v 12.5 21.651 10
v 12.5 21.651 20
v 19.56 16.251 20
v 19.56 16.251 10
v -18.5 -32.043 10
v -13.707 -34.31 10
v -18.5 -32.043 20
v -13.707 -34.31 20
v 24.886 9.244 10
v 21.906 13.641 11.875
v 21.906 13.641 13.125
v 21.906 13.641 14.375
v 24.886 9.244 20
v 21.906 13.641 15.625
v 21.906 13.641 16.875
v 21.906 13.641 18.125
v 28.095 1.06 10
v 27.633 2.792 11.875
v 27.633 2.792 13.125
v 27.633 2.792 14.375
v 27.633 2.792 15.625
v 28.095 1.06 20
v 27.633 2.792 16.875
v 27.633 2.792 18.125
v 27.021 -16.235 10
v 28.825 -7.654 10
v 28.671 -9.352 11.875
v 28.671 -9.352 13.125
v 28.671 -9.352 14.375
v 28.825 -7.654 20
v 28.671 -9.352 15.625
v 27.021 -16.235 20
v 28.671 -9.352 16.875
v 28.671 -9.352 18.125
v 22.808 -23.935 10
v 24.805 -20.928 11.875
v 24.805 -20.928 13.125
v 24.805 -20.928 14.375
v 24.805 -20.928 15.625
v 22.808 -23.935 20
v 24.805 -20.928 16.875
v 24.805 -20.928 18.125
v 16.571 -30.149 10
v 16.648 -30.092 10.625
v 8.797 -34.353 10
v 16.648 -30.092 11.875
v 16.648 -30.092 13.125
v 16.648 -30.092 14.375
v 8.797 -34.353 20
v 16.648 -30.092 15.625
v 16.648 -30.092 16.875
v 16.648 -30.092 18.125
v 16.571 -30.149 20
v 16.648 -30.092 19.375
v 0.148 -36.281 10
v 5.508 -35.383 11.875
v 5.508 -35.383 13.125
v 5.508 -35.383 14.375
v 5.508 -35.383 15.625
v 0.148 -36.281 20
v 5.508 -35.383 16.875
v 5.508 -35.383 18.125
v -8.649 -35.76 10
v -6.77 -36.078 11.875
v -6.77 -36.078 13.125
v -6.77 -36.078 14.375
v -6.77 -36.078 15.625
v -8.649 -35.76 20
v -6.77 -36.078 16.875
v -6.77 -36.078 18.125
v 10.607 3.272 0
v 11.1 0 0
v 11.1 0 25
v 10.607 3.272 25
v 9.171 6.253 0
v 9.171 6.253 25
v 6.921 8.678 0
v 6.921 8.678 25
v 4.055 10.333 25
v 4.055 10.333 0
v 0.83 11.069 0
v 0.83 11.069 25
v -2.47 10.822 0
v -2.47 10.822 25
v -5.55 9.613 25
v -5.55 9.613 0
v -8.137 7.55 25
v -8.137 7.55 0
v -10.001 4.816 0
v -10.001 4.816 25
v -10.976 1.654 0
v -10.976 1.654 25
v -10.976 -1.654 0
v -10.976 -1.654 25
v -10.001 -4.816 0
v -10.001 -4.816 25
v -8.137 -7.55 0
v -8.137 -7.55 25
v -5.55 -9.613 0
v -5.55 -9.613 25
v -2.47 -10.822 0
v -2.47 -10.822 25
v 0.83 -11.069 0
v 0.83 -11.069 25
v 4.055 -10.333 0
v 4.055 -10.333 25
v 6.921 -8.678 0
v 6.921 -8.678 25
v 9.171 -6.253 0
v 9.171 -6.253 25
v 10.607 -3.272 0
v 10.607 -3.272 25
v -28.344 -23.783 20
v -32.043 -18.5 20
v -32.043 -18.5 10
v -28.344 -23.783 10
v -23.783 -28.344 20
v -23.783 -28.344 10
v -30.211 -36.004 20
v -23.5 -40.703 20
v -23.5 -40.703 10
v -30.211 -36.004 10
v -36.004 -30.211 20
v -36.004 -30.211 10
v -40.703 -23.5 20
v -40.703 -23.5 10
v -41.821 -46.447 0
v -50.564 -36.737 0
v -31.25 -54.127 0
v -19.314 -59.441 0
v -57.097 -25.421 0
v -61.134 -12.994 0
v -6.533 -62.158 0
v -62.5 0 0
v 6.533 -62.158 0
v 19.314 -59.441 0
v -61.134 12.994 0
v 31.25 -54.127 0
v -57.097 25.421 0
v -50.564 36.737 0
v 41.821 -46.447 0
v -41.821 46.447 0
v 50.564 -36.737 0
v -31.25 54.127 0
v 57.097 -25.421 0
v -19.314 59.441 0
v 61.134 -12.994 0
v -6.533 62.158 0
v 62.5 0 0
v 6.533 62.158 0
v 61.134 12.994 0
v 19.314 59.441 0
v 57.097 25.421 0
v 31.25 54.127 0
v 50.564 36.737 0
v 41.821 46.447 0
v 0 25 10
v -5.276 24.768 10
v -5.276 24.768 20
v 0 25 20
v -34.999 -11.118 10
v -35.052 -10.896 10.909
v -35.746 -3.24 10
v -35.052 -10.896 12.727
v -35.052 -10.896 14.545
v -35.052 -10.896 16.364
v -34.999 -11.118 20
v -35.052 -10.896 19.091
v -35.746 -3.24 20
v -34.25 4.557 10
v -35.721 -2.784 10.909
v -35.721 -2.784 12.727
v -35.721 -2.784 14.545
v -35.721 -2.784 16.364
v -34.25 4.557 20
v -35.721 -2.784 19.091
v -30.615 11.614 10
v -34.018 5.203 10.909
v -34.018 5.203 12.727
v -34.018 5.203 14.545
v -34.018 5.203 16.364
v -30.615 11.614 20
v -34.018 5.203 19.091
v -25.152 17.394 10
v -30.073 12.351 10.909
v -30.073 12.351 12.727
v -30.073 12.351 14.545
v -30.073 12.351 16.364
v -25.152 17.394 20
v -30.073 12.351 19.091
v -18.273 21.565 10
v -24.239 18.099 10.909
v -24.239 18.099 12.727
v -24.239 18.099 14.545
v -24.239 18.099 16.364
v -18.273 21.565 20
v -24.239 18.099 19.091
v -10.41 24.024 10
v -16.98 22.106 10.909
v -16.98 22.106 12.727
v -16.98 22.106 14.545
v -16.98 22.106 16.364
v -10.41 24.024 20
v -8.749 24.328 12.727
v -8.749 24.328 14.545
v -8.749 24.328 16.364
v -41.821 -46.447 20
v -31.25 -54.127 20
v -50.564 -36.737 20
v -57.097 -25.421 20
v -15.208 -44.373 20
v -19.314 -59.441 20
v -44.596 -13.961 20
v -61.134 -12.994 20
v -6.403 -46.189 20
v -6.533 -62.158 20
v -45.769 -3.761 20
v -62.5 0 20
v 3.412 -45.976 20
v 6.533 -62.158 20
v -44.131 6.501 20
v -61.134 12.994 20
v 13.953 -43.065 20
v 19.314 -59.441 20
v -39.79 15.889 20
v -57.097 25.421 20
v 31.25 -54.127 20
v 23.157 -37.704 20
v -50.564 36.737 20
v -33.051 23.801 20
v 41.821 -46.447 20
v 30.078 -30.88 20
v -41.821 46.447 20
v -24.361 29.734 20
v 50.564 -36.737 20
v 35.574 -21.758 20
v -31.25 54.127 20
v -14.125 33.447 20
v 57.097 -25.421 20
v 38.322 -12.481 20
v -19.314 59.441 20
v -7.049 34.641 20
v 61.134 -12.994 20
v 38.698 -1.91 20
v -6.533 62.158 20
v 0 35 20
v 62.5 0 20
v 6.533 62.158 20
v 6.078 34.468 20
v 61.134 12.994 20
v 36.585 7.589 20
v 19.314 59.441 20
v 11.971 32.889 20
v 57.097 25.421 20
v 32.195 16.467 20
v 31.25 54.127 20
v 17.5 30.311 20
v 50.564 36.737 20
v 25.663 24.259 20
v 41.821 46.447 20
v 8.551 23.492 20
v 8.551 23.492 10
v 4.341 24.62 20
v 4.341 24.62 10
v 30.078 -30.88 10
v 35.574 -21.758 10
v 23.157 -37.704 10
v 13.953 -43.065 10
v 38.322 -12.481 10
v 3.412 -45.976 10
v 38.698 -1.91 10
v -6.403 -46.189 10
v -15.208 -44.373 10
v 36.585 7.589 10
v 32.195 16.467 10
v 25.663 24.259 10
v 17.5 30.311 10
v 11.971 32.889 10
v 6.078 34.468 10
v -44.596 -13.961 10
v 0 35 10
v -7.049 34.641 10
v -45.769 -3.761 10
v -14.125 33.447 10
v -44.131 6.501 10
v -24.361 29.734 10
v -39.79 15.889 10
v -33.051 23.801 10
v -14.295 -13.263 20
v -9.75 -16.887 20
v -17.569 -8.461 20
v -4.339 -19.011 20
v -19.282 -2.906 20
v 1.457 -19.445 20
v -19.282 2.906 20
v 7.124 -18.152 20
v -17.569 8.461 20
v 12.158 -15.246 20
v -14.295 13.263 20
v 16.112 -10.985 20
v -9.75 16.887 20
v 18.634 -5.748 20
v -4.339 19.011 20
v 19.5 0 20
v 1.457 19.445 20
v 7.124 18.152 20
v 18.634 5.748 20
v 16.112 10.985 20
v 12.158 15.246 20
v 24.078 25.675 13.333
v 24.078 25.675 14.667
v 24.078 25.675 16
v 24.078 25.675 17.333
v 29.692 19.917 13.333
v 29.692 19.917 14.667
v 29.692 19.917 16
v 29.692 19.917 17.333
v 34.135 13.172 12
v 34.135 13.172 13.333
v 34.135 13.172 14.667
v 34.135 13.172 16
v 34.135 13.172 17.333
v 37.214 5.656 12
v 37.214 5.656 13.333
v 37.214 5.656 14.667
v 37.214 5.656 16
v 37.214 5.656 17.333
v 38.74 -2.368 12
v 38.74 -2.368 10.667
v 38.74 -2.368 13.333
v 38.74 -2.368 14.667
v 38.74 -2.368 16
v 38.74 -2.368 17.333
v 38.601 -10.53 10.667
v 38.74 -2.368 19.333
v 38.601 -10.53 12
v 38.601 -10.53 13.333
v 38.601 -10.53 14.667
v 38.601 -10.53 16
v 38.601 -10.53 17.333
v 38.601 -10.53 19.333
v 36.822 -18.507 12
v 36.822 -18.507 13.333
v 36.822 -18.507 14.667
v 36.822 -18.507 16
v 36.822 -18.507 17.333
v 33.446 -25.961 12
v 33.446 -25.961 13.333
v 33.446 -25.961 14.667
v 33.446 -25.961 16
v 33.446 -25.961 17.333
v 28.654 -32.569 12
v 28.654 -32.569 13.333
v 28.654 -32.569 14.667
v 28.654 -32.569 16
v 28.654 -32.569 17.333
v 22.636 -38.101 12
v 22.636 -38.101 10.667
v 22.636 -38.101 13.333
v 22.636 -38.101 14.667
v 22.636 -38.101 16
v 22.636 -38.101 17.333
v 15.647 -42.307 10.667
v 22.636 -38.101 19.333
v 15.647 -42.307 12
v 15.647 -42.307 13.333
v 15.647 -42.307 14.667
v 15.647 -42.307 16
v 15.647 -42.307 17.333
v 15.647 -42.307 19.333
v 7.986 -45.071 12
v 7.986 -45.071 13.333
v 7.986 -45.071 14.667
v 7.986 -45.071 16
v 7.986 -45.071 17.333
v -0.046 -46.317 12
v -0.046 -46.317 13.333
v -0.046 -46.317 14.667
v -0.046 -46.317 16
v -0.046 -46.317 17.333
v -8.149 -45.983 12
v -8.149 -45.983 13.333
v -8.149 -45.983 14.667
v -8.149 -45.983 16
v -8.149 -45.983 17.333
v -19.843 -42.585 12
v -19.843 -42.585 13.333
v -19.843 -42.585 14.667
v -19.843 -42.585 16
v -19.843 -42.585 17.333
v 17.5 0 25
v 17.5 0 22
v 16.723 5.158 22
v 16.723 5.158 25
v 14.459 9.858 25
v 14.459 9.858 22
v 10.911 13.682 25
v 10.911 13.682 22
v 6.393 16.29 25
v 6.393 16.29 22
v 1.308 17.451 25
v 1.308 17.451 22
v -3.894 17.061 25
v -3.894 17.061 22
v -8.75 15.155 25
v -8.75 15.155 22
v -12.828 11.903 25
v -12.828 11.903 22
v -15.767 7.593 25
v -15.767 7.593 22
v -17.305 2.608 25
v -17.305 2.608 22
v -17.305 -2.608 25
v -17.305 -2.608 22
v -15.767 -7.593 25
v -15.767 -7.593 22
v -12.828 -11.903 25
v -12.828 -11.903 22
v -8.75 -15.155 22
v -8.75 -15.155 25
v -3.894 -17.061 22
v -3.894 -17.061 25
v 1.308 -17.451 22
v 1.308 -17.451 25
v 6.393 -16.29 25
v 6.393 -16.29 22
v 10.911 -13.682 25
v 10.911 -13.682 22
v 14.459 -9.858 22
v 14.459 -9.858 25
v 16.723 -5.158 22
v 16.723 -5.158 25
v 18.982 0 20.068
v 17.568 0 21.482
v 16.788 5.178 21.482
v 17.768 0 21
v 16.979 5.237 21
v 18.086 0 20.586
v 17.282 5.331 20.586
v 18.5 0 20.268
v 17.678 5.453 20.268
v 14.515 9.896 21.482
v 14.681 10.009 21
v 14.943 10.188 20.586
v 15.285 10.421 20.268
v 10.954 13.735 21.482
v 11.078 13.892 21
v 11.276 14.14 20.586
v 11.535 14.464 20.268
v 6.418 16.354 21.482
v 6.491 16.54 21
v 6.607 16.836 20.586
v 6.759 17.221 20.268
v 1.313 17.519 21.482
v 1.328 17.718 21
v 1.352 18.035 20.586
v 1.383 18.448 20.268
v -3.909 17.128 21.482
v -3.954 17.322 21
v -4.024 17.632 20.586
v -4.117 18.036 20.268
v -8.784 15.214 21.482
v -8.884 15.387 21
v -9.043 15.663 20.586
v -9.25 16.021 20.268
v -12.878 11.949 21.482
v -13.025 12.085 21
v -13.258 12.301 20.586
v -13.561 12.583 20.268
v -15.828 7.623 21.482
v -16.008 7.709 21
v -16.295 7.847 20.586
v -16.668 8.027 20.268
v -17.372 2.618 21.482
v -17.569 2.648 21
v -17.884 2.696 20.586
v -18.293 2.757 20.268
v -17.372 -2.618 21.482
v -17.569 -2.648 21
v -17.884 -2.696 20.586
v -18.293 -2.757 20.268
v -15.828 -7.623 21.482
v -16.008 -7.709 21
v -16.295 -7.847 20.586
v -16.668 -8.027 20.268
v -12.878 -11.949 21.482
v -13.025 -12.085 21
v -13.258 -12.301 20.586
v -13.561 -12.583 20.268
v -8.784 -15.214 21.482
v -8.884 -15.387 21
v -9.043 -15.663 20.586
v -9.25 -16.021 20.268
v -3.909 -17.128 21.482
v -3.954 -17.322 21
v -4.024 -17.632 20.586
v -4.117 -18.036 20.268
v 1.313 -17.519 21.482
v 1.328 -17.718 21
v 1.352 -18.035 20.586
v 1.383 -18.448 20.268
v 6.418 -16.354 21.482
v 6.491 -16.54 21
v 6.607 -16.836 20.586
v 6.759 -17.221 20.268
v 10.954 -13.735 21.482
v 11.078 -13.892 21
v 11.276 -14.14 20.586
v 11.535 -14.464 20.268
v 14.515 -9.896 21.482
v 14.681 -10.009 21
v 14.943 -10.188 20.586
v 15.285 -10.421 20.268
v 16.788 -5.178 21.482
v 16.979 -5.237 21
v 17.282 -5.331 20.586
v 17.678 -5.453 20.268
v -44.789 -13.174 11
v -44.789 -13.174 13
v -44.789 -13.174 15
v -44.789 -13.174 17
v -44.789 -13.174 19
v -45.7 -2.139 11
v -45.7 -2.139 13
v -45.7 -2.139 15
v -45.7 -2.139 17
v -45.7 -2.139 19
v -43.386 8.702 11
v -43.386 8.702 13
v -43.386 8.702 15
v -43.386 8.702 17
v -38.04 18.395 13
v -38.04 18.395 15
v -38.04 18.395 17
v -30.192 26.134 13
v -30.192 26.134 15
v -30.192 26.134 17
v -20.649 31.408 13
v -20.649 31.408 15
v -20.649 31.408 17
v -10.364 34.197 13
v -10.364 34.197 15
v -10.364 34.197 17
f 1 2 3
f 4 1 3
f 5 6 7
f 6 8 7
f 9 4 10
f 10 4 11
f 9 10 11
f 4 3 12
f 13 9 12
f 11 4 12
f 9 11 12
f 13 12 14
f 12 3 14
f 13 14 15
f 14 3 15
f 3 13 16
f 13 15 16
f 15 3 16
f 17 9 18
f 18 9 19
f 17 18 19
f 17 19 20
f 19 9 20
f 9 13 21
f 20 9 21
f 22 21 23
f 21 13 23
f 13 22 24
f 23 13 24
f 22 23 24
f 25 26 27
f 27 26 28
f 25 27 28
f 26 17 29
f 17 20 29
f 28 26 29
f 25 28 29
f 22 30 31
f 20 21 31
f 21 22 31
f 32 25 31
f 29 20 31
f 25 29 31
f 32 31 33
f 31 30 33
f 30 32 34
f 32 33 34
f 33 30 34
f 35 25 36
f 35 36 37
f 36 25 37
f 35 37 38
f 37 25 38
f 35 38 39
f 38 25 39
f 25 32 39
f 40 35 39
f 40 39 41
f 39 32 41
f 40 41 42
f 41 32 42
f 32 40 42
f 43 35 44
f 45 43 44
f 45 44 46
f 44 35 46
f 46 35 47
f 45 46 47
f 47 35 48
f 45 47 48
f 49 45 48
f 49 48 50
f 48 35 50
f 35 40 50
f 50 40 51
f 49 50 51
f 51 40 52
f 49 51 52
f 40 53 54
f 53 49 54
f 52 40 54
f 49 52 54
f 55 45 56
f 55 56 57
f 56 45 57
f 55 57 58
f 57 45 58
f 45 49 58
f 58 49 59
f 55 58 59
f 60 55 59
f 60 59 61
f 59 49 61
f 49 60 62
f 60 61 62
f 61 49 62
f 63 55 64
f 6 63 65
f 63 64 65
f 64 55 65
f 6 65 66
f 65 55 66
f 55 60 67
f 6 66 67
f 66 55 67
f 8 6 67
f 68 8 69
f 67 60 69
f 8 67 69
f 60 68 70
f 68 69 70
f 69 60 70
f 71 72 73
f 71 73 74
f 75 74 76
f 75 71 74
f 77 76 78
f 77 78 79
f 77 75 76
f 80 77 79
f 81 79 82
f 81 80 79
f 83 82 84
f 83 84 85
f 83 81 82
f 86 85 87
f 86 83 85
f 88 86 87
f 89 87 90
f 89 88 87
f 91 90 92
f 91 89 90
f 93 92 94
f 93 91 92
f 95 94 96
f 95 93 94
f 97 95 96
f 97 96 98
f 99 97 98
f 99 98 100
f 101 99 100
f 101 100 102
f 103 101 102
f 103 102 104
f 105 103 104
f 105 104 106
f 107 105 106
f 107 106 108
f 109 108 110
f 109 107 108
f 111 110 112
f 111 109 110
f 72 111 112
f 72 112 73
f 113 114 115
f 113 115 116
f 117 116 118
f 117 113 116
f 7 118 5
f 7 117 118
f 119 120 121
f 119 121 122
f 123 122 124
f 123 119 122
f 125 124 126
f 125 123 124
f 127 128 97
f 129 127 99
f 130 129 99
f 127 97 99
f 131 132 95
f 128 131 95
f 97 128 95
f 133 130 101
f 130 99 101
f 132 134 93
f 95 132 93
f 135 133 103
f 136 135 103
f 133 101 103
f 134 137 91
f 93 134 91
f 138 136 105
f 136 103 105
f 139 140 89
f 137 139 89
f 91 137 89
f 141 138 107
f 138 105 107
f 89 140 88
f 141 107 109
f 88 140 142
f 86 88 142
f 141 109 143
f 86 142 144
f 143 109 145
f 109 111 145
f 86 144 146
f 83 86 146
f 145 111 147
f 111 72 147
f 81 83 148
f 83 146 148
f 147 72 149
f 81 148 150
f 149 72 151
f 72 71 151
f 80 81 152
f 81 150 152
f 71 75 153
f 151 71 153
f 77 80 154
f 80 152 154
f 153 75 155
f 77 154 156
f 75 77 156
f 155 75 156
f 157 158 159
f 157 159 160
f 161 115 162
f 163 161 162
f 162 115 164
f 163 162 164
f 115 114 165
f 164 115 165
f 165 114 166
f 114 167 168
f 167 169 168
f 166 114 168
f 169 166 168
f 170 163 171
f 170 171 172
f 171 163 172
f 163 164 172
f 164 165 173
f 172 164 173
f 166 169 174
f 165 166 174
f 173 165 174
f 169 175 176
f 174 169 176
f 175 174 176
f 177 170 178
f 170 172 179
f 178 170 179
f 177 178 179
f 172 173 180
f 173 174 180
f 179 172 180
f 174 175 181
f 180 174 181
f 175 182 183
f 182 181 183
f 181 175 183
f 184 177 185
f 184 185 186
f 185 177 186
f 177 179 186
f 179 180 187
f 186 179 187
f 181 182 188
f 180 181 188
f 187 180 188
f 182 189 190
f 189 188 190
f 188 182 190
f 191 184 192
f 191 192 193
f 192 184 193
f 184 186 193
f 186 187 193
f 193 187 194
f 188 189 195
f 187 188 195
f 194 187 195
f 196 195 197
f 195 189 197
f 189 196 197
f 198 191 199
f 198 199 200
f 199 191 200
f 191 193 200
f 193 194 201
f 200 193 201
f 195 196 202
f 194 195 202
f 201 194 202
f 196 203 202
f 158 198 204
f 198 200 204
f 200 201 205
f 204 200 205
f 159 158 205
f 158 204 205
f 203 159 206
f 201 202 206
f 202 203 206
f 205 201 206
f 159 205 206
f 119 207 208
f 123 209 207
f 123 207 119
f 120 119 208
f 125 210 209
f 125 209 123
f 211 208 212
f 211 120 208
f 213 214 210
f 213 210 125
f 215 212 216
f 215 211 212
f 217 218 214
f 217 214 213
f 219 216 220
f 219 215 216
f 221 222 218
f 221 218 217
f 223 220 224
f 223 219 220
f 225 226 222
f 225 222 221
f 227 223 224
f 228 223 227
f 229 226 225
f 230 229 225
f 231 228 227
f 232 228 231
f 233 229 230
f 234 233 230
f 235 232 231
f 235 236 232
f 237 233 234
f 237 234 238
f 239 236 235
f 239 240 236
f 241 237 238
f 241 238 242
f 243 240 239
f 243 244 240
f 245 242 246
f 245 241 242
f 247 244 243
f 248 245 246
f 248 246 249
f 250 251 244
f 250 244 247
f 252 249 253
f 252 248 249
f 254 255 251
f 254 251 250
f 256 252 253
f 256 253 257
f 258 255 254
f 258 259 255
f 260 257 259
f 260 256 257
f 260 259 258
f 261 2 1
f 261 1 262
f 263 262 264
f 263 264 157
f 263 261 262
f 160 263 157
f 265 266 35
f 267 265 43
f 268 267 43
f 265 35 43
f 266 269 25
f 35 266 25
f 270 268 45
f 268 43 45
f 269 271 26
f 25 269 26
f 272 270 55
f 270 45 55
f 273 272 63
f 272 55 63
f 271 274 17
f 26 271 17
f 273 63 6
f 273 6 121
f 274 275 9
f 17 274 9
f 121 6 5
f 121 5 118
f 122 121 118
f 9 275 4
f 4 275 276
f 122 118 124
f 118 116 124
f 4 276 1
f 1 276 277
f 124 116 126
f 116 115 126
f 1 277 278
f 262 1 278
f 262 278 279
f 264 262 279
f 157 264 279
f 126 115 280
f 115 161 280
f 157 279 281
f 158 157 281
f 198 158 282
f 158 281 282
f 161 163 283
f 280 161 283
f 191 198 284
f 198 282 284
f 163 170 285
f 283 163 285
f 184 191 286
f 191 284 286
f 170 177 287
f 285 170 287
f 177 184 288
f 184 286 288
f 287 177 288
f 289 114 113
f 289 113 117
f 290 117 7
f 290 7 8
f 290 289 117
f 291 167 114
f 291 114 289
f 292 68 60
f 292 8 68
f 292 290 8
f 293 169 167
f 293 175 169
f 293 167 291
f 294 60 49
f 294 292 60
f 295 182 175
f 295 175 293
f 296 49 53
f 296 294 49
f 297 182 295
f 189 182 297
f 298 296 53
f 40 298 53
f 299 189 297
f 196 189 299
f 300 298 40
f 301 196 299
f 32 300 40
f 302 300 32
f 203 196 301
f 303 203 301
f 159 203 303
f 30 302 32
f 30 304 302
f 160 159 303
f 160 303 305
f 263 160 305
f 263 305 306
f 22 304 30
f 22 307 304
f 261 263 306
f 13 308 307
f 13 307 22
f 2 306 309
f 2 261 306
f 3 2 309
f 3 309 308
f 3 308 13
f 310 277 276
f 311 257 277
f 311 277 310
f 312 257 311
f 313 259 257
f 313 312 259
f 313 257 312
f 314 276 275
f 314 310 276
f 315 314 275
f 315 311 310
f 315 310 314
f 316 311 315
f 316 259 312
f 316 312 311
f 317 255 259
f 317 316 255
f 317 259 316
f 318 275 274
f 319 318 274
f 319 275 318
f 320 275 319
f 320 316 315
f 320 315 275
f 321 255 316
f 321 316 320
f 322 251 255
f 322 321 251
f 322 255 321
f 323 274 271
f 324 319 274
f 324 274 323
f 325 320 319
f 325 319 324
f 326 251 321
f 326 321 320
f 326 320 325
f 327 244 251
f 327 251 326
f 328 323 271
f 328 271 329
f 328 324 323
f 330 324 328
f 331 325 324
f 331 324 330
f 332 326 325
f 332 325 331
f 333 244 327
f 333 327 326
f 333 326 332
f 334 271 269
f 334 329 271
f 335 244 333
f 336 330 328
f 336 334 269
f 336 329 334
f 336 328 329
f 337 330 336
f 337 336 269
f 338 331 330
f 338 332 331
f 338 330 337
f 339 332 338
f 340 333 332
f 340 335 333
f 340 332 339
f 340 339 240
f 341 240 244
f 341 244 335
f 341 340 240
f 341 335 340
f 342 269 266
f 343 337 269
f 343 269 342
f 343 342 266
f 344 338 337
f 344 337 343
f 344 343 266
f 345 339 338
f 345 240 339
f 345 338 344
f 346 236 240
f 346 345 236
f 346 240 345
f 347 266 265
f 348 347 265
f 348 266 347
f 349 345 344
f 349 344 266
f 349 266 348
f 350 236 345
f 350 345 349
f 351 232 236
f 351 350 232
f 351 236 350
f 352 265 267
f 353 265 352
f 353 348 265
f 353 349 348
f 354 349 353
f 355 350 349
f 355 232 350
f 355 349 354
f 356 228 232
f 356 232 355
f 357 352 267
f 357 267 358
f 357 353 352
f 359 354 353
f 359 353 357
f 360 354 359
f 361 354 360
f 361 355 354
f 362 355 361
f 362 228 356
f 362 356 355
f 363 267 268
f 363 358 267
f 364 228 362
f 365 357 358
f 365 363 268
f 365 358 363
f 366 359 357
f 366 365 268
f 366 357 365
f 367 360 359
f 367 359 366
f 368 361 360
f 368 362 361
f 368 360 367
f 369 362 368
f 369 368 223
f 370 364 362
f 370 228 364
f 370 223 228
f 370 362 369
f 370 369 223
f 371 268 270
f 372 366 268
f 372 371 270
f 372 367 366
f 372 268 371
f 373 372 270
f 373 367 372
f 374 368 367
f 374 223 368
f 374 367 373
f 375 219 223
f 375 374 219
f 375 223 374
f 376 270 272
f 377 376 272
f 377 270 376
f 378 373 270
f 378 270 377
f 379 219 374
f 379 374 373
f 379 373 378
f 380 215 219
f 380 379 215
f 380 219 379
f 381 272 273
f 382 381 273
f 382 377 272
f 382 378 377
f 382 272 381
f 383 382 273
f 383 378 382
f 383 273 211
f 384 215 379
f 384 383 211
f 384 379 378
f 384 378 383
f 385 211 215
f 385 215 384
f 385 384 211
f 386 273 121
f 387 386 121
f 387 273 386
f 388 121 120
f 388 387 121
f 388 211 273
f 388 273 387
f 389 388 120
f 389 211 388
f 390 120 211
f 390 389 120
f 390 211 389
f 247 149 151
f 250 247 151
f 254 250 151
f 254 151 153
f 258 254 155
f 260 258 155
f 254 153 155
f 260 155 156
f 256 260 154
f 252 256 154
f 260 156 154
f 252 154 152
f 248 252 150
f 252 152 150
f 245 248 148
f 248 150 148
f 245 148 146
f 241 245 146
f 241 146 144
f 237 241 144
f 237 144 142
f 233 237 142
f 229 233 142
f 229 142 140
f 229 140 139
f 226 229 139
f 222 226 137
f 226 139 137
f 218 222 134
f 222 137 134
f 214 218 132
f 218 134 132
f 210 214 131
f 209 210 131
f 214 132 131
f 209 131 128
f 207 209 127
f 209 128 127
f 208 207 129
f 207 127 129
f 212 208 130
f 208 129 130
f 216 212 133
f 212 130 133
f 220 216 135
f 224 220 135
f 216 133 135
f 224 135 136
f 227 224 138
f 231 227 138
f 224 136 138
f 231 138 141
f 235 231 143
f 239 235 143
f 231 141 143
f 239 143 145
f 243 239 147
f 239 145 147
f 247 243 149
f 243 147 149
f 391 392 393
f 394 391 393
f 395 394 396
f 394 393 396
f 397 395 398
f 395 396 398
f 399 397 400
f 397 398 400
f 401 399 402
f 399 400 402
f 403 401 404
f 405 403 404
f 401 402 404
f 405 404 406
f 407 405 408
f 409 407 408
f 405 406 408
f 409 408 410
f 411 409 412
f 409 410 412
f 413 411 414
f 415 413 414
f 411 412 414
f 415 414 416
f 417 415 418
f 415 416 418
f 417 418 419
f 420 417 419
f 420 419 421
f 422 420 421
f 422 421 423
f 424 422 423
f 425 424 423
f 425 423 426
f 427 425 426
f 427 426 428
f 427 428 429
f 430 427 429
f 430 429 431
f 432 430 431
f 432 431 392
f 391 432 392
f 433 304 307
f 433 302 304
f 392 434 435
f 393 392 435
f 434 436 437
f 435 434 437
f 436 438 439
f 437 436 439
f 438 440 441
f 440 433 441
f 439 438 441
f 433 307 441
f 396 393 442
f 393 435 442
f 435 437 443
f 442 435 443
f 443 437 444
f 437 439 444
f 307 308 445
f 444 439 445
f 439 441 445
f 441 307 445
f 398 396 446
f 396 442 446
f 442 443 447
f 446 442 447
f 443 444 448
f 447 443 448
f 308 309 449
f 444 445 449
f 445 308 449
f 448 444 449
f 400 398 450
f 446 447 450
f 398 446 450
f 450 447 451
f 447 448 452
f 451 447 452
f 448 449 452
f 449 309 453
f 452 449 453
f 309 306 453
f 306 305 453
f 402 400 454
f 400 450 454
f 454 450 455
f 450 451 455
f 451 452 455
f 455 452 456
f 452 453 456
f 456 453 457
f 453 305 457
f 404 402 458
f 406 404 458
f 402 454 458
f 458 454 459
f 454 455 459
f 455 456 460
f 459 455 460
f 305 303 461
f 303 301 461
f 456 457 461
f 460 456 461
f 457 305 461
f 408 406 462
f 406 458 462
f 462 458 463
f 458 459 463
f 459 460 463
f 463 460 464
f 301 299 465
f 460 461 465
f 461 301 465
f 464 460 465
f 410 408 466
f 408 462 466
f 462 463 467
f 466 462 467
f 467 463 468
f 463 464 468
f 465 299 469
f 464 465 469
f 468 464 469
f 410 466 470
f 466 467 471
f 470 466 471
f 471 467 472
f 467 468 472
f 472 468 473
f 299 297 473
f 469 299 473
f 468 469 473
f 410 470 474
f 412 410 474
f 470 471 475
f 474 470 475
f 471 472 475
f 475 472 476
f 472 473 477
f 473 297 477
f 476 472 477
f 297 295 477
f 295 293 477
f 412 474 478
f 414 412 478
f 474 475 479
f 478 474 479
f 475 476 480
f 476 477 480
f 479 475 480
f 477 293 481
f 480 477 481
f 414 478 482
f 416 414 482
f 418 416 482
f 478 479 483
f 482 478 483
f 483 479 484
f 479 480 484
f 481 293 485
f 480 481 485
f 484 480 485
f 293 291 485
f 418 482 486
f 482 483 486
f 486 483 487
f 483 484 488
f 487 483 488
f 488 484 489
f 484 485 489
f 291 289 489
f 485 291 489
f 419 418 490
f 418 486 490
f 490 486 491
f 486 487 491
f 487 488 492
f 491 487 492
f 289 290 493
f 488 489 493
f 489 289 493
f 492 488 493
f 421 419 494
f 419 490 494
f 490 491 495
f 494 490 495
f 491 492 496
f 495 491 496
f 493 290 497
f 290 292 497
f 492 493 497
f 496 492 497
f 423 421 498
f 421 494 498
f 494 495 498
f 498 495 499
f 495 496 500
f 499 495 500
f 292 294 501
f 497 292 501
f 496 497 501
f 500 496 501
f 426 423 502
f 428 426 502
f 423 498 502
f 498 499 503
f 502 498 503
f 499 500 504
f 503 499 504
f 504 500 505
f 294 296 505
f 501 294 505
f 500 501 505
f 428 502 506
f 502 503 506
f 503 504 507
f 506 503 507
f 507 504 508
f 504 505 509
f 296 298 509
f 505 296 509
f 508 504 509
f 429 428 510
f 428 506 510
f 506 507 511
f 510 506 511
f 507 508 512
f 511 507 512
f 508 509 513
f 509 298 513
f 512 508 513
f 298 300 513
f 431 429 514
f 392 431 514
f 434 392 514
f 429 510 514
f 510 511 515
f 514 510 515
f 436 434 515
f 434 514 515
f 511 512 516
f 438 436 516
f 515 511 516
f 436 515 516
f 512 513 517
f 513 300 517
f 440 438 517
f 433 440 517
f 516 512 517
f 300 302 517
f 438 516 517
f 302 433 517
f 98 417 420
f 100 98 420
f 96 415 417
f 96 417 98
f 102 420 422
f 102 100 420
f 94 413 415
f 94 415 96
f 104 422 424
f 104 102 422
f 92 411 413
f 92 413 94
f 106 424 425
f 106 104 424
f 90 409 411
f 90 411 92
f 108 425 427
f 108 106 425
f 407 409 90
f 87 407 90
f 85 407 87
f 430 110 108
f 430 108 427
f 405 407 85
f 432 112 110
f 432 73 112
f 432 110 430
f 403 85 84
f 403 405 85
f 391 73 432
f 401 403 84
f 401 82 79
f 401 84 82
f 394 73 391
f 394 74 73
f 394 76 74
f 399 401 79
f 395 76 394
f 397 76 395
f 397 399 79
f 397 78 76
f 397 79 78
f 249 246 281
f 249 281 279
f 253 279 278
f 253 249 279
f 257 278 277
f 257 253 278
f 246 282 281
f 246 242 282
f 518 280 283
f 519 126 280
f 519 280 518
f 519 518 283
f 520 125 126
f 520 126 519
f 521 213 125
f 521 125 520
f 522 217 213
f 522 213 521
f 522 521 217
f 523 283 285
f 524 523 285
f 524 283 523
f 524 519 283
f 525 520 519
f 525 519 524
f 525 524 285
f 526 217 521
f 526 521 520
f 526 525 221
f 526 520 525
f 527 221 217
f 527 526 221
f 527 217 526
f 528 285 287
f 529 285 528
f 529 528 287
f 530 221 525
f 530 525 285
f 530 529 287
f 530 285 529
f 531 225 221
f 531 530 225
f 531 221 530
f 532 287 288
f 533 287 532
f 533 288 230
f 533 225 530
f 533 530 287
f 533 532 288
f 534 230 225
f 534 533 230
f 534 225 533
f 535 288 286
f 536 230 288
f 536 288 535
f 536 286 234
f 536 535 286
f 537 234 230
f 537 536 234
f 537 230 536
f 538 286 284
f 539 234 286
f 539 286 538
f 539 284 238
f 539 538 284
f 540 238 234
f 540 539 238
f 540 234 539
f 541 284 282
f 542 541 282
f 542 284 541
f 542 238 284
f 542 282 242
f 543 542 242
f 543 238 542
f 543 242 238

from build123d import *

# Parameters (mm, degrees)
SKETCH_1_R          = 62.5
SKETCH_1_R_2        = 17.5
EXTRUDE_1_DEPTH     = 20
SKETCH_1_3_R        = 17.5
SKETCH_1_3_R_2      = 11.1
EXTRUDE_2_DEPTH     = 25
FILLET_1_R          = 2
CUT_EXTRUDE_3_DEPTH = 10


with BuildPart() as part:
    # 草圖1 → 伸長1 (new body)
    with BuildSketch(Plane.XY):
        Circle(SKETCH_1_R)
        Circle(SKETCH_1_R_2, mode=Mode.SUBTRACT)
    extrude(amount=EXTRUDE_1_DEPTH)

    # 草圖1<3> → 伸長2 (add)
    with BuildSketch(Plane.XY):
        Circle(SKETCH_1_3_R)
        Circle(SKETCH_1_3_R_2, mode=Mode.SUBTRACT)
    extrude(amount=EXTRUDE_2_DEPTH)

    # 圓角1
    fillet_1_edges = [part.edges().sort_by_distance(p)[0] for p in [
        (-17.5, 0, 20),
    ]]
    fillet(fillet_1_edges, radius=FILLET_1_R)

    # 草圖2 → 伸長3 (cut)
    # profile 1 of 2: a face of its own
    with BuildSketch(Plane.XY.offset(20)):
        with BuildLine():
            add(Edge.make_bspline(
                [(-40.703193978, -23.5), (-41.633468538, -21.888717197), (-43.261081238, -18.515622169), (-45.47602304, -11.436735837), (-46.243691745, -2.107968515), (-43.902529687, 8.897505781), (-38.463548338, 18.728740964), (-30.481363737, 26.558580127), (-20.761184619, 31.841785399), (-12.098446566, 34.077729261), (-5.163063209, 34.881869437), (-1.724610104, 35), (0, 35)],
                knots=[0, 0, 0, 0, 0.0625, 0.125, 0.25, 0.375, 0.5, 0.625, 0.75, 0.875, 0.9375, 1, 1, 1, 1], degree=3))
            ThreePointArc((0, 35), (9.058666579, 33.80740392), (17.5, 30.310889132))
            add(Edge.make_bspline(
                [(17.5, 30.310889132), (19.823071752, 28.969663031), (24.242241599, 25.860788384), (31.767486538, 18.159304931), (36.957936485, 8.442419858), (39.023468486, -2.347510431), (38.872672018, -10.560155104), (37.094152942, -18.593345142), (33.679815381, -26.106950798), (28.861351557, -32.744129421), (20.777254706, -40.190094393), (10.741659927, -44.903538266), (-0.034110412, -46.584563974), (-8.185130119, -46.241615161), (-14.797664919, -44.661390317), (-19.864008497, -42.647893398), (-22.312751805, -41.388652043), (-23.5, -40.703193978)],
                knots=[0, 0, 0, 0, 0.0625, 0.125, 0.25, 0.3125, 0.375, 0.4375, 0.5, 0.5625, 0.625, 0.75, 0.8125, 0.875, 0.9375, 0.96875, 1, 1, 1, 1], degree=3))
            ThreePointArc((-23.5, -40.703193978), (-33.234018716, -33.234018716), (-40.703193978, -23.5))
        make_face()
        with BuildLine():
            ThreePointArc((-36.373066959, -21), (-29.69848481, -29.69848481), (-21, -36.373066959))
            add(Edge.make_bspline(
                [(15, 25.980762114), (19.626342308, 23.309742136), (27.962941081, 15.94725242), (35.002577573, -0.237057072), (33.123865827, -19.358084353), (20.586920622, -35.934246999), (-0.118084402, -43.440012631), (-14.591726515, -40.07288538), (-21, -36.373066959)],
                knots=[0, 0, 0, 0, 0.139447987, 0.287926298, 0.449747773, 0.62466703, 0.809633221, 1, 1, 1, 1], degree=3))
            ThreePointArc((15, 25.980762114), (7.764571353, 28.977774789), (0, 30))
            add(Edge.make_bspline(
                [(-36.373066959, -21), (-38.826726203, -16.750137525), (-41.728361124, -7.389186422), (-39.760869449, 6.972263731), (-32.441668175, 18.614971808), (-22.070852951, 26.028055814), (-10.910814995, 29.43602294), (-3.551275269, 30), (0, 30)],
                knots=[0, 0, 0, 0, 0.188917464, 0.373337047, 0.548988681, 0.712236233, 0.861396552, 1, 1, 1, 1], degree=3))
        make_face(mode=Mode.SUBTRACT)
    # profile 2 of 2: a face of its own
    with BuildSketch(Plane.XY.offset(20)):
        with BuildLine():
            add(Edge.make_bspline(
                [(-36.373066959, -21), (-38.826726203, -16.750137525), (-41.728361124, -7.389186422), (-39.760869449, 6.972263731), (-32.441668175, 18.614971808), (-22.070852951, 26.028055814), (-10.910814995, 29.43602294), (-3.551275269, 30), (0, 30)],
                knots=[0, 0, 0, 0, 0.188917464, 0.373337047, 0.548988681, 0.712236233, 0.861396552, 1, 1, 1, 1], degree=3))
            ThreePointArc((0, 30), (7.764571353, 28.977774789), (15, 25.980762114))
            add(Edge.make_bspline(
                [(15, 25.980762114), (19.626342308, 23.309742136), (27.962941081, 15.94725242), (35.002577573, -0.237057072), (33.123865827, -19.358084353), (20.586920622, -35.934246999), (-0.118084402, -43.440012631), (-14.591726515, -40.07288538), (-21, -36.373066959)],
                knots=[0, 0, 0, 0, 0.139447987, 0.287926298, 0.449747773, 0.62466703, 0.809633221, 1, 1, 1, 1], degree=3))
            ThreePointArc((-21, -36.373066959), (-29.69848481, -29.69848481), (-36.373066959, -21))
        make_face()
        with BuildLine():
            ThreePointArc((-32.04293994, -18.5), (-26.162950904, -26.162950904), (-18.5, -32.04293994))
            add(Edge.make_bspline(
                [(12.5, 21.650635095), (14.30005051, 20.611375448), (17.736546036, 18.19228211), (22.05735975, 13.766251439), (25.469897133, 8.589069076), (27.834895803, 2.837183943), (28.986233619, -3.184904344), (28.876055873, -9.377887783), (27.535742309, -15.415921648), (24.990235447, -21.021768672), (21.332338771, -26.062630488), (16.775819727, -30.259430929), (11.450819301, -33.450705308), (5.550233068, -35.577660612), (-0.603962424, -36.53664799), (-6.792105874, -36.274910535), (-12.848540176, -34.833293242), (-16.692189533, -33.0866798), (-18.5, -32.04293994)],
                knots=[0, 0, 0, 0, 0.0625, 0.125, 0.1875, 0.25, 0.3125, 0.375, 0.4375, 0.5, 0.5625, 0.625, 0.6875, 0.75, 0.8125, 0.875, 0.9375, 1, 1, 1, 1], degree=3))
            ThreePointArc((12.5, 21.650635095), (6.470476128, 24.148145657), (0, 25))
            add(Edge.make_bspline(
                [(-32.04293994, -18.5), (-32.728164967, -17.313155438), (-33.927114764, -14.828407043), (-35.558015667, -9.615244062), (-36.119608205, -2.766575398), (-34.400322061, 5.348624633), (-30.388137801, 12.591820816), (-25.469517856, 17.423005266), (-20.794111606, 20.416968225), (-15.767671789, 22.768018014), (-10.206799727, 24.225660689), (-4.442252157, 24.897281873), (-1.474613785, 25), (0, 25)],
                knots=[0, 0, 0, 0, 0.0625, 0.125, 0.25, 0.375, 0.5, 0.625, 0.6875, 0.75, 0.875, 0.9375, 1, 1, 1, 1], degree=3))
        make_face(mode=Mode.SUBTRACT)
    extrude(amount=-CUT_EXTRUDE_3_DEPTH, mode=Mode.SUBTRACT)


solid = part.part
